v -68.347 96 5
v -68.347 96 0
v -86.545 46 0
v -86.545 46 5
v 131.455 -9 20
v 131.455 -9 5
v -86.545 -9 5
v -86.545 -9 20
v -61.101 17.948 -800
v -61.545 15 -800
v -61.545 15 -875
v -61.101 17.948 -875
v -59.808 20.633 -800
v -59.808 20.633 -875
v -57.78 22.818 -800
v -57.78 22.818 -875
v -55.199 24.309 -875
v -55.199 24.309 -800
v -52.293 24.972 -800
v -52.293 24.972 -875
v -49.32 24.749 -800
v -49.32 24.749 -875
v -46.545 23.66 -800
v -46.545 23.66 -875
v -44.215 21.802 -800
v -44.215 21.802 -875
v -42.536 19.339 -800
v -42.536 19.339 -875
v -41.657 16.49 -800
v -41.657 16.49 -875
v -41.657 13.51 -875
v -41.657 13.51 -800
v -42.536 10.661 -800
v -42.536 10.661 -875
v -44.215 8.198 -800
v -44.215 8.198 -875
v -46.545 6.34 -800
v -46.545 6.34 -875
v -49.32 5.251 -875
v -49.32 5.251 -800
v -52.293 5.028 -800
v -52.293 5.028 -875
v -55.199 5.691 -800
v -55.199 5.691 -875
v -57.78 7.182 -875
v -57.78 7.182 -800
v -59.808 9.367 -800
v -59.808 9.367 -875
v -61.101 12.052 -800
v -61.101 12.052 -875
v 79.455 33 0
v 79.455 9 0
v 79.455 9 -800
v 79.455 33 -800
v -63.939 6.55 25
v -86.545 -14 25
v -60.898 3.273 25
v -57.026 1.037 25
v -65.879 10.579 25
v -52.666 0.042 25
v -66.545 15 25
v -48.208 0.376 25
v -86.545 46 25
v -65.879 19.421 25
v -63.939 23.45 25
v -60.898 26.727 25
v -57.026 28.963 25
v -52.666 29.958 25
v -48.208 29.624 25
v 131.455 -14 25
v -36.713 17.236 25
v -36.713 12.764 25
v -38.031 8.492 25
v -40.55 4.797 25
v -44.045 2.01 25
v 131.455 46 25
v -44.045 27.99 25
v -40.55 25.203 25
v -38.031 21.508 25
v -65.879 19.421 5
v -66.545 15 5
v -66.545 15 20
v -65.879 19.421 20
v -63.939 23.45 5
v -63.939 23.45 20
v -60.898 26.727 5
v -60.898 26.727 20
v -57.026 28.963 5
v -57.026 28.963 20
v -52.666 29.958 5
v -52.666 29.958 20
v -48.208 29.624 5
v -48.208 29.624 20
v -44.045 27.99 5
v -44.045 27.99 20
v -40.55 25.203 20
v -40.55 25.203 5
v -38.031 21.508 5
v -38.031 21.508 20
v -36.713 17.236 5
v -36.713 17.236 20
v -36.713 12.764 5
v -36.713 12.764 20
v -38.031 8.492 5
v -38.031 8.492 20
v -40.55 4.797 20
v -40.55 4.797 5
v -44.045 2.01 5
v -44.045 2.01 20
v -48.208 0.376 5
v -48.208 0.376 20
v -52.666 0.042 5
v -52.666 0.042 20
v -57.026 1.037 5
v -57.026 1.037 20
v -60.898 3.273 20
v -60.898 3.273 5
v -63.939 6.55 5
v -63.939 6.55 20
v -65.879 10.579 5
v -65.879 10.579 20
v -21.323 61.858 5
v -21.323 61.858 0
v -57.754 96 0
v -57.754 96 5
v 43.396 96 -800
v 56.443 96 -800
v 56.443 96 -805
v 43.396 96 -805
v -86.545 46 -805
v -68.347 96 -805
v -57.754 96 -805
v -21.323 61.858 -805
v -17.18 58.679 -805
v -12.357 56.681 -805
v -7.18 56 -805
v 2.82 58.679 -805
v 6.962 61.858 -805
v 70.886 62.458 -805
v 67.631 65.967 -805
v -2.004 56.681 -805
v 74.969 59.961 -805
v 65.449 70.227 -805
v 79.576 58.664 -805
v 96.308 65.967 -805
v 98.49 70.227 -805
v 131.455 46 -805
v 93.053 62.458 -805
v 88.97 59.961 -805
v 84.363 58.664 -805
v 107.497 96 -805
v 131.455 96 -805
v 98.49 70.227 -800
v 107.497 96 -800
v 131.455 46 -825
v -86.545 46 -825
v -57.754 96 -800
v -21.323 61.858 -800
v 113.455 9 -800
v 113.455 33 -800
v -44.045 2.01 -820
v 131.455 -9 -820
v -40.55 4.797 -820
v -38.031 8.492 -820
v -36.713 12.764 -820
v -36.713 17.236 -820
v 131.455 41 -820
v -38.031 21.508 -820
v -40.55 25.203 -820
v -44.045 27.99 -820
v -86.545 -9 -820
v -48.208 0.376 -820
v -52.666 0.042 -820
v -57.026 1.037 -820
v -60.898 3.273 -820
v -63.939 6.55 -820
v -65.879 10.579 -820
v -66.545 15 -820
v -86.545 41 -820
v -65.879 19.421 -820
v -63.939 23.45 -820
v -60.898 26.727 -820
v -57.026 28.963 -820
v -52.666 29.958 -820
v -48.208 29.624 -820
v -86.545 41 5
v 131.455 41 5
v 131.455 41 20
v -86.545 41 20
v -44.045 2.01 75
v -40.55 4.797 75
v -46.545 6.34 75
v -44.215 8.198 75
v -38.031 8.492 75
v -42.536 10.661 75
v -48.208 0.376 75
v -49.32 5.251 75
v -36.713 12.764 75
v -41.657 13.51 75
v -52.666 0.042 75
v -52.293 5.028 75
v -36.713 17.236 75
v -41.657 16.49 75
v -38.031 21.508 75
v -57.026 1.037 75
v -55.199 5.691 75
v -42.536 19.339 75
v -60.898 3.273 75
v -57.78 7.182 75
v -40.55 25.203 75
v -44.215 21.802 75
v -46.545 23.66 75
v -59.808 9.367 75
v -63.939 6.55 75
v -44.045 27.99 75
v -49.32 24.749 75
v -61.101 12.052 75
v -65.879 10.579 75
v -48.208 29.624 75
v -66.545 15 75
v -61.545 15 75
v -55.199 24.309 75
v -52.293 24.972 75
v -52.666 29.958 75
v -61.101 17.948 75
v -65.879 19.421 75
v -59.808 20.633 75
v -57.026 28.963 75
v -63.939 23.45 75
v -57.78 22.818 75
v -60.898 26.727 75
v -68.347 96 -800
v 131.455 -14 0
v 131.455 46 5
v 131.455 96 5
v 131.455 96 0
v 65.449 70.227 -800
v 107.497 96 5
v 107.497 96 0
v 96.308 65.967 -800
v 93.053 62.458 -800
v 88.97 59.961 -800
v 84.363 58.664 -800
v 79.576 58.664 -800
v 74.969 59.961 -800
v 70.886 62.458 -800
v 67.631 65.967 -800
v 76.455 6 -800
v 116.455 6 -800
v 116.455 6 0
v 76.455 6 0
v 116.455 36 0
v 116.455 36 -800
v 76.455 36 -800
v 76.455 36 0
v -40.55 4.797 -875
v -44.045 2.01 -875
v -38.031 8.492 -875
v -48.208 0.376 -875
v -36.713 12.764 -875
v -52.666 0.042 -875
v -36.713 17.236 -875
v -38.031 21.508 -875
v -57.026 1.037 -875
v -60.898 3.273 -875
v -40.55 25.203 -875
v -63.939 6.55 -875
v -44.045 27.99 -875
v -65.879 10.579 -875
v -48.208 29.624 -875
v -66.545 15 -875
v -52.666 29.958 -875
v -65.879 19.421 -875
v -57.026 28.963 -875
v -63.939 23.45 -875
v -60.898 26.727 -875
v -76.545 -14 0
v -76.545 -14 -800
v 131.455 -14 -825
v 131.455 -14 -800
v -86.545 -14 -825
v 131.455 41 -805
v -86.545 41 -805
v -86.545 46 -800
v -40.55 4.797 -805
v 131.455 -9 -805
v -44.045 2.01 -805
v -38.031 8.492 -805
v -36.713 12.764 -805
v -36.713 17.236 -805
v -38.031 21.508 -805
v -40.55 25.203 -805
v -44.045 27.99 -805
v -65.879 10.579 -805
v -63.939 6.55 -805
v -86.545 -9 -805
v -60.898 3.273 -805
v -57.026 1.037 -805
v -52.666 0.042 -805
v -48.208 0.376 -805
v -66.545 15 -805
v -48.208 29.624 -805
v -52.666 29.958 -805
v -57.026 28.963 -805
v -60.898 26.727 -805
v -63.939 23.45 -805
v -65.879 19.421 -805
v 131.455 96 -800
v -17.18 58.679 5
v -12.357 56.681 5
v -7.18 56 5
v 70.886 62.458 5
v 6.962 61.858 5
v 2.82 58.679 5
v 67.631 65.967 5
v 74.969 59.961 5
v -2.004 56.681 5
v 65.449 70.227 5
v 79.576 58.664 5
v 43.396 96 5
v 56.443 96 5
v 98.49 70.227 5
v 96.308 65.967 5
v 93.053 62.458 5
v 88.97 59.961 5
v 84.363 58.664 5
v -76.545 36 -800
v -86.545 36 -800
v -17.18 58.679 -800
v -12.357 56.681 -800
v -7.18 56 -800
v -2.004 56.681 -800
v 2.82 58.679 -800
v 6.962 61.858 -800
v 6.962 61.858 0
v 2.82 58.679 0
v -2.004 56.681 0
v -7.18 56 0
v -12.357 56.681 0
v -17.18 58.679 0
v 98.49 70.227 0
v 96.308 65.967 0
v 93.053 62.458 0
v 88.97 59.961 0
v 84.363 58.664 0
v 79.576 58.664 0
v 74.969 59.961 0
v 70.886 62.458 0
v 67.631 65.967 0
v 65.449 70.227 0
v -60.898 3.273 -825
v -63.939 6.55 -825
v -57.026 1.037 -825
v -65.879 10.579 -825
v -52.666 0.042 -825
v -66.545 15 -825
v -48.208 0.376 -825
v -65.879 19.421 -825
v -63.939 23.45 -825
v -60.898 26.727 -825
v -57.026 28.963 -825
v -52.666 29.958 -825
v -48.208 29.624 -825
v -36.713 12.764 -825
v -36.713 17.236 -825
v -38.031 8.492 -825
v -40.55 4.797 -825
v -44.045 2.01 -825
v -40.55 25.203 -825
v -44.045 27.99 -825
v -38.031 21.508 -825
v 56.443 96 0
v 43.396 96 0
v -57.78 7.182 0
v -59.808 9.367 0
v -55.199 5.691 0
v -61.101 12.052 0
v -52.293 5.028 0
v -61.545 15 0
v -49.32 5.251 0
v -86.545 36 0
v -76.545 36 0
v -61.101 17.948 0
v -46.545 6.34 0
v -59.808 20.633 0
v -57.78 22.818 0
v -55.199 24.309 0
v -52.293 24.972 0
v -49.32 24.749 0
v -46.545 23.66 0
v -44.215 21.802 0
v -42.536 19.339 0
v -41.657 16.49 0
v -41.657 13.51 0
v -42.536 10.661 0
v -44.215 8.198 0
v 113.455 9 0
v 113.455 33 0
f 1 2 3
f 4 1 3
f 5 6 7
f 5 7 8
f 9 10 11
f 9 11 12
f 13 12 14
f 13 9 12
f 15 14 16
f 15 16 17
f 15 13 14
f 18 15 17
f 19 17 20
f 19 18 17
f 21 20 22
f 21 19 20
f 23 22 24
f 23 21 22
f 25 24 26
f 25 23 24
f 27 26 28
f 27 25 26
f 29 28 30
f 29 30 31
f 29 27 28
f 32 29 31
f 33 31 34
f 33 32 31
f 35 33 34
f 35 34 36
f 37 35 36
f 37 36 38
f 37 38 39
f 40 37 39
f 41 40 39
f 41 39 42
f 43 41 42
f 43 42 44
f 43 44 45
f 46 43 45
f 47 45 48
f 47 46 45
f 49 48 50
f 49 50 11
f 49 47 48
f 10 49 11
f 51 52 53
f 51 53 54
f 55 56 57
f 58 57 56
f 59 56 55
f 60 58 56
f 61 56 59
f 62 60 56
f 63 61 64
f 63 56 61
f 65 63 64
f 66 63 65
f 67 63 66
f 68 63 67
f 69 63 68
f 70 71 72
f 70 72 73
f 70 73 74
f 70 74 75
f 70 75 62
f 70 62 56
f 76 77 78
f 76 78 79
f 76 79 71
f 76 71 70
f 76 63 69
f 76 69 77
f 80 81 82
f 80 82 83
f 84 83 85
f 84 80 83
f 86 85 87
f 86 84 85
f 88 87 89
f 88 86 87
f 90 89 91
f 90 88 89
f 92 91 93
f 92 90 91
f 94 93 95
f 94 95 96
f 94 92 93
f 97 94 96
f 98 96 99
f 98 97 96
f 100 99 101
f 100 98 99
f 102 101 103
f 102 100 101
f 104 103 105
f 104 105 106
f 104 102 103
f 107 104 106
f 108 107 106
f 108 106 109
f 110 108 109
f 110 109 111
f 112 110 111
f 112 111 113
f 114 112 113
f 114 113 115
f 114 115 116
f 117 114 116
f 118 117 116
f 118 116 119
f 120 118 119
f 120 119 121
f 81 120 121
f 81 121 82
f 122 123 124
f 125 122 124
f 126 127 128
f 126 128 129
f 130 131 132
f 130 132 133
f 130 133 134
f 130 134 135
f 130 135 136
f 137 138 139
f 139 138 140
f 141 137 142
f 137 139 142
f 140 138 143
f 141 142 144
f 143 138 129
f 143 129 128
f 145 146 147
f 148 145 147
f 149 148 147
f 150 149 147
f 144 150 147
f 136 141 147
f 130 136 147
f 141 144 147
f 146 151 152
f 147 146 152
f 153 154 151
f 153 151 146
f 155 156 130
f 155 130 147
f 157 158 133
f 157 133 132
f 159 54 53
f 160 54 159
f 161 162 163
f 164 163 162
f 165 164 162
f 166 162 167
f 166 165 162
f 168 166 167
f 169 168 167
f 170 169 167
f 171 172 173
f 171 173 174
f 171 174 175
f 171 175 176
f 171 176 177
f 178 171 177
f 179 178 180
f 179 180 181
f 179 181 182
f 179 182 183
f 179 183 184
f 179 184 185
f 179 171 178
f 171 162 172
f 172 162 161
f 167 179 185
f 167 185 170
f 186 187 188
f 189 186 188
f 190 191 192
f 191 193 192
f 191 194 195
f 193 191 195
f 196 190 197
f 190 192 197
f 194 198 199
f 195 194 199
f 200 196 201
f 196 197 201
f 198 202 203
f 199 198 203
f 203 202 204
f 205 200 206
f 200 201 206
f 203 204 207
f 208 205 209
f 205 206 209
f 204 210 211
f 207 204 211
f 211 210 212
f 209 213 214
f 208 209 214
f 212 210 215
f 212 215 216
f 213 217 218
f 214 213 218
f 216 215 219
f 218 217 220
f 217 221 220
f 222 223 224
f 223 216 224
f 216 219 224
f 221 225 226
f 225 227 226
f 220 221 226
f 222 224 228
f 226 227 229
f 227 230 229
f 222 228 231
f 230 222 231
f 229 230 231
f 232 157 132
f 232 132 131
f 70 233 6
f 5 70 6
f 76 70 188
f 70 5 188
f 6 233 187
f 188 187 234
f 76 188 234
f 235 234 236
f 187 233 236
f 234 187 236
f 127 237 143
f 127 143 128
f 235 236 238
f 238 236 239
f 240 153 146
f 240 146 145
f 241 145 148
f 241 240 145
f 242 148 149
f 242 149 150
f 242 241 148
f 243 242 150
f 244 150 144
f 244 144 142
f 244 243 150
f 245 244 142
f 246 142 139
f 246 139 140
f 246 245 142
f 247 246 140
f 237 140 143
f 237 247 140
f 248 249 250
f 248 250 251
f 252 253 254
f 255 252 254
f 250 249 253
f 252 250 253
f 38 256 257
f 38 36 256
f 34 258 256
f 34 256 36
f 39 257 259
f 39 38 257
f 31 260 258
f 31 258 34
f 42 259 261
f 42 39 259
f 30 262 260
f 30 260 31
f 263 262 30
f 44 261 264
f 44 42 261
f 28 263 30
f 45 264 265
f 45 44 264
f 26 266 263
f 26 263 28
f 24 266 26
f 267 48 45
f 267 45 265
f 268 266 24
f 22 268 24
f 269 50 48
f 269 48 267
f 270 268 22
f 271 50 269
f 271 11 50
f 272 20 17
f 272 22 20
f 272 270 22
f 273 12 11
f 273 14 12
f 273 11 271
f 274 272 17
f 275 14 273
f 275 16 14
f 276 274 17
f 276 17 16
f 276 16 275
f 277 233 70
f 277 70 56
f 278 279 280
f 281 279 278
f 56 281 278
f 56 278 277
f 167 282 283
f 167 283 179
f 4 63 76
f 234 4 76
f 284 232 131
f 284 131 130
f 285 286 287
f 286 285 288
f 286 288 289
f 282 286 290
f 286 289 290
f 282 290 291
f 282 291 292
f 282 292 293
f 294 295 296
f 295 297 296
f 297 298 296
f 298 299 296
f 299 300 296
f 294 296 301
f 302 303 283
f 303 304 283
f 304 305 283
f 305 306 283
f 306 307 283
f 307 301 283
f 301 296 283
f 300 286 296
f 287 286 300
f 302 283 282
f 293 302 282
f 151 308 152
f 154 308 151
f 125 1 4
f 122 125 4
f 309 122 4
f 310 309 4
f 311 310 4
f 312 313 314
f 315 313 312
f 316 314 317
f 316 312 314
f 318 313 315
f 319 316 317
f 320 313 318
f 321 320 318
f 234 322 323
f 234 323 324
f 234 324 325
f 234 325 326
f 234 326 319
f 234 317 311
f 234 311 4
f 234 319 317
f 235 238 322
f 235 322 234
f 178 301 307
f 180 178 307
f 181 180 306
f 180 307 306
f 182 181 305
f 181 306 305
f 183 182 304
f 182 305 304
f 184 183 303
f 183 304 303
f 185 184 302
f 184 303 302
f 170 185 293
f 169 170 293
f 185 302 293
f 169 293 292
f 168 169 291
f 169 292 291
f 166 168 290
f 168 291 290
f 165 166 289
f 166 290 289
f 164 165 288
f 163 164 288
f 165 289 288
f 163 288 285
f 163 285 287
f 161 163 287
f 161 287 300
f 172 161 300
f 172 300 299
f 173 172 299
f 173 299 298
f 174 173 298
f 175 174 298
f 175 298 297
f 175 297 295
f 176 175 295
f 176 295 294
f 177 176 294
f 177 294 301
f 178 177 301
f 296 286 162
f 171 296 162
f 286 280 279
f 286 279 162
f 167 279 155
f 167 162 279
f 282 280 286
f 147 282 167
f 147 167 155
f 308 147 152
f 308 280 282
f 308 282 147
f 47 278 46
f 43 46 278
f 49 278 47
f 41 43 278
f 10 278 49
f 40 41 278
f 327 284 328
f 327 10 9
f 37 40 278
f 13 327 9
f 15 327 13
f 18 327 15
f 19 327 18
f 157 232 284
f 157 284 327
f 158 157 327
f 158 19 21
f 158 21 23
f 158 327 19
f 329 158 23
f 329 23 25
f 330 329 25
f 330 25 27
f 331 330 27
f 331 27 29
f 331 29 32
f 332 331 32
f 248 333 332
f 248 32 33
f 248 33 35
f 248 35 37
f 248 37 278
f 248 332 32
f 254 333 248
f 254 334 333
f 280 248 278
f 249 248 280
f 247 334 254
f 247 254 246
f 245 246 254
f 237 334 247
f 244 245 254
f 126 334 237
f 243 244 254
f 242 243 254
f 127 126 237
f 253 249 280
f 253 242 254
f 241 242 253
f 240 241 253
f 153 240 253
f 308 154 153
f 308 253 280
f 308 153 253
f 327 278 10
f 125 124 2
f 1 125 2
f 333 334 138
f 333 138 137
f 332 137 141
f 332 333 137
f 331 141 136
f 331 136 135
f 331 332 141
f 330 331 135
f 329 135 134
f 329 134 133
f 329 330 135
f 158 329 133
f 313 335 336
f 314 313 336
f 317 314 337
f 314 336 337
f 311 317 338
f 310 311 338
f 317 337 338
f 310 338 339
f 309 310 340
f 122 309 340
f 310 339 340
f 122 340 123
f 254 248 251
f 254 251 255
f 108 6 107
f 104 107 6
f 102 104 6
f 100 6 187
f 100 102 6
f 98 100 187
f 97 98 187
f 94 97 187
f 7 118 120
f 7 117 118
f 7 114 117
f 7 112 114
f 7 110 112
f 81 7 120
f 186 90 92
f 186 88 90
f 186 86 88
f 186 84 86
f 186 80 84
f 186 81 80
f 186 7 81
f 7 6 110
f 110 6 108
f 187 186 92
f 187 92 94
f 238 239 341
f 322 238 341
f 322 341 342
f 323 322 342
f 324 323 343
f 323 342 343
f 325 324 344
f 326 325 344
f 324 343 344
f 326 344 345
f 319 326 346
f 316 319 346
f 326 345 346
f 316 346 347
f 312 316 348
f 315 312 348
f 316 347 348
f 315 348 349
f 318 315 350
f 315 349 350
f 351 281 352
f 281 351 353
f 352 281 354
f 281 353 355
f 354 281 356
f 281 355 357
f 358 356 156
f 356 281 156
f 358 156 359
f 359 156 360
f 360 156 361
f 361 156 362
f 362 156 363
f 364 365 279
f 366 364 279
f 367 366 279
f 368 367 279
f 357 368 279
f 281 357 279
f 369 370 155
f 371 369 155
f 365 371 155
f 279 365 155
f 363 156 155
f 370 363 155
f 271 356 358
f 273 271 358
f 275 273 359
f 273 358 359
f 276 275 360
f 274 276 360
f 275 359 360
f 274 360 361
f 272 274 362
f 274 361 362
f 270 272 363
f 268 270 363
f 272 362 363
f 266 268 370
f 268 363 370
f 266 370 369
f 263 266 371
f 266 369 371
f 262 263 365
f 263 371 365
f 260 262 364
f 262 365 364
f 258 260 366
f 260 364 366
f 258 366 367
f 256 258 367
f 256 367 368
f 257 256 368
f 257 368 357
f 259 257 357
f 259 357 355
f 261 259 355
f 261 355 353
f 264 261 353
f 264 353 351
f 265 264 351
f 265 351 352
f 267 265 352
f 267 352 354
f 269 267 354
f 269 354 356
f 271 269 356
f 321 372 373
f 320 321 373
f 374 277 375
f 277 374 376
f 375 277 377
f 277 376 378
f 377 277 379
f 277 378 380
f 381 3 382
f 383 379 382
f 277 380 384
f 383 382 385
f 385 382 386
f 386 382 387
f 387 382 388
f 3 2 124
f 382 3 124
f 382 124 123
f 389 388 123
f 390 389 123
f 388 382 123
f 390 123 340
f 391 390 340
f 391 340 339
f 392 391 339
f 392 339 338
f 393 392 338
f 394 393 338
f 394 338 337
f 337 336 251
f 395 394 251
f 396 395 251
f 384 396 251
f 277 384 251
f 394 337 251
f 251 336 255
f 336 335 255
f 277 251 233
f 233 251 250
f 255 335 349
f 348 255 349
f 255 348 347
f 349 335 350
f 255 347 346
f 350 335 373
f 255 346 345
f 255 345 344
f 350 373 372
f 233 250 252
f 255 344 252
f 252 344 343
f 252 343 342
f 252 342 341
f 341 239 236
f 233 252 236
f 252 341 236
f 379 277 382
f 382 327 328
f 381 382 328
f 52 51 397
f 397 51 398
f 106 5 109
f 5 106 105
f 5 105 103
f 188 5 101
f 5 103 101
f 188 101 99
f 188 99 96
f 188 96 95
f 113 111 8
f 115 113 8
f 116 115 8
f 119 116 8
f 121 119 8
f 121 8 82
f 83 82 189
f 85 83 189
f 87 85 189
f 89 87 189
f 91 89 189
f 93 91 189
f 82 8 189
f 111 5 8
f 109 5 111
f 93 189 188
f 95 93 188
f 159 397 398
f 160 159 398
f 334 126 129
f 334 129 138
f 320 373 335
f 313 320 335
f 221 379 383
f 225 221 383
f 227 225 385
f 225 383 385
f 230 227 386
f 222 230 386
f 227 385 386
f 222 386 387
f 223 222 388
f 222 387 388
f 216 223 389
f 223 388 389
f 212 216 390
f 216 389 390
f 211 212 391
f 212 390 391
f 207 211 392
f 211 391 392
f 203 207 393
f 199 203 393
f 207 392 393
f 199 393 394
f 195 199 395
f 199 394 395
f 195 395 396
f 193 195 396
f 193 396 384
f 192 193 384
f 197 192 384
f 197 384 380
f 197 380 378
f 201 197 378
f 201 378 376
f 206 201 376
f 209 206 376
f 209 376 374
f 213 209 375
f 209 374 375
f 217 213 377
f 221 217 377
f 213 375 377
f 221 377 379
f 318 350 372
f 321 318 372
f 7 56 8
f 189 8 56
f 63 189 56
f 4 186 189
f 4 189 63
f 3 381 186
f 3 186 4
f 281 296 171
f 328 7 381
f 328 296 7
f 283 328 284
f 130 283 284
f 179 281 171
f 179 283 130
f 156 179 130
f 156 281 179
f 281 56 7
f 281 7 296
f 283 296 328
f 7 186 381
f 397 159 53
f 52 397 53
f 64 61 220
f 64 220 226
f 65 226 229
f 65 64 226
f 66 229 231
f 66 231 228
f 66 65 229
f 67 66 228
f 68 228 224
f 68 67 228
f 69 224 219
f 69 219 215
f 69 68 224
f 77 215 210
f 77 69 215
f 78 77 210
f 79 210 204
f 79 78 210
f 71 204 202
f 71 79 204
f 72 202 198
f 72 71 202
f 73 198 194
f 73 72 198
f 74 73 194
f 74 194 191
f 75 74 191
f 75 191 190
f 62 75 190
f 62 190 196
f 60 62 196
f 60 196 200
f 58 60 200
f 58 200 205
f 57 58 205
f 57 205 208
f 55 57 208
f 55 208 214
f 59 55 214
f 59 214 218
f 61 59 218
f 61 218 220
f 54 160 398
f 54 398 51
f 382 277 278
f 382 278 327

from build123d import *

# Parameters (mm, degrees)
SKETCH3_R           = 15
BOSS_EXTRUDE1_DEPTH = 25
SKETCH5_W           = 218
SKETCH5_H           = 50
CUT_EXTRUDE1_DEPTH  = 20
SKETCH7_W           = 15
SKETCH7_H           = 50
CUT_EXTRUDE3_DEPTH  = 219
SKETCH8_R           = 15
SKETCH8_R_2         = 10
BOSS_EXTRUDE7_DEPTH = 75
SKETCH9_W           = 10
SKETCH9_H           = 50
BOSS_EXTRUDE8_DEPTH = 400
SKETCH10_W          = 40
SKETCH10_H          = 30
SKETCH10_W_2        = 34
SKETCH10_H_2        = 24
BOSS_EXTRUDE9_DEPTH = 400


with BuildPart() as part:
    # Sketch3 → Boss-Extrude1 (new body)
    with BuildSketch(Plane.XY):
        with BuildLine():
            Line((-68.346942832, 96), (-86.545454545, 46))
            Line((-86.545454545, 46), (-86.545454545, -14))
            Line((-86.545454545, -14), (131.454545455, -14))
            Line((131.454545455, -14), (131.454545455, 96))
            Line((131.454545455, 96), (107.496522982, 96))
            Line((107.496522982, 96), (98.489850442, 70.226827292))
            ThreePointArc((98.489850442, 70.226827292), (81.969545455, 58.5), (65.449240467, 70.226827292))
            Line((65.449240467, 70.226827292), (56.442567927, 96))
            Line((56.442567927, 96), (43.395745829, 96))
            Line((43.395745829, 96), (6.961681078, 61.857864376))
            ThreePointArc((6.961681078, 61.857864376), (-7.180454545, 56), (-21.322590169, 61.857864376))
            Line((-21.322590169, 61.857864376), (-57.753891674, 96))
            Line((-57.753891674, 96), (-68.346942832, 96))
        make_face()
        with Locations((-51.545454545, 15)):
            Circle(SKETCH3_R, mode=Mode.SUBTRACT)
    extrude(amount=BOSS_EXTRUDE1_DEPTH)

    # Sketch5 → Cut-Extrude1 (cut)
    with BuildSketch(Plane.XY.offset(25)):
        with Locations((22.454545455, 71)):
            Rectangle(SKETCH5_W, SKETCH5_H)
    extrude(amount=-CUT_EXTRUDE1_DEPTH, mode=Mode.SUBTRACT)

    # Sketch7 → Cut-Extrude3 (cut, through all)
    with BuildSketch(Plane.ZY.offset(86.545454545)):
        with Locations((12.5, 16)):
            Rectangle(SKETCH7_W, SKETCH7_H)
    extrude(amount=-CUT_EXTRUDE3_DEPTH, mode=Mode.SUBTRACT)

    # Sketch8 → Boss-Extrude7 (add)
    with BuildSketch(Plane(origin=(0, 0, 0), x_dir=(-1, 0, 0), z_dir=(0, 0, -1))):
        with Locations((51.545454545, 15)):
            Circle(SKETCH8_R)
        with Locations((51.545454545, 15)):
            Circle(SKETCH8_R_2, mode=Mode.SUBTRACT)
    extrude(amount=-BOSS_EXTRUDE7_DEPTH)

    # Sketch9 → Boss-Extrude8 (add)
    with BuildSketch(Plane(origin=(0, 0, 0), x_dir=(-1, 0, 0), z_dir=(0, 0, -1))):
        with Locations((81.545454545, 11)):
            Rectangle(SKETCH9_W, SKETCH9_H)
    extrude(amount=BOSS_EXTRUDE8_DEPTH)

    # Sketch10 → Boss-Extrude9 (add)
    with BuildSketch(Plane(origin=(0, 0, 0), x_dir=(-1, 0, 0), z_dir=(0, 0, -1))):
        with Locations((-96.454545455, 21)):
            Rectangle(SKETCH10_W, SKETCH10_H)
        with Locations((-96.454545455, 21)):
            Rectangle(SKETCH10_W_2, SKETCH10_H_2, mode=Mode.SUBTRACT)
    extrude(amount=BOSS_EXTRUDE9_DEPTH)

    # Mirror1: part across plane


with BuildPart() as part_1:
    add(part.part)
    add(part.part.mirror(Plane(origin=(0, 0, -400), x_dir=(1, 0, 0), z_dir=(0, 0, -1))))


solid = part_1.part
